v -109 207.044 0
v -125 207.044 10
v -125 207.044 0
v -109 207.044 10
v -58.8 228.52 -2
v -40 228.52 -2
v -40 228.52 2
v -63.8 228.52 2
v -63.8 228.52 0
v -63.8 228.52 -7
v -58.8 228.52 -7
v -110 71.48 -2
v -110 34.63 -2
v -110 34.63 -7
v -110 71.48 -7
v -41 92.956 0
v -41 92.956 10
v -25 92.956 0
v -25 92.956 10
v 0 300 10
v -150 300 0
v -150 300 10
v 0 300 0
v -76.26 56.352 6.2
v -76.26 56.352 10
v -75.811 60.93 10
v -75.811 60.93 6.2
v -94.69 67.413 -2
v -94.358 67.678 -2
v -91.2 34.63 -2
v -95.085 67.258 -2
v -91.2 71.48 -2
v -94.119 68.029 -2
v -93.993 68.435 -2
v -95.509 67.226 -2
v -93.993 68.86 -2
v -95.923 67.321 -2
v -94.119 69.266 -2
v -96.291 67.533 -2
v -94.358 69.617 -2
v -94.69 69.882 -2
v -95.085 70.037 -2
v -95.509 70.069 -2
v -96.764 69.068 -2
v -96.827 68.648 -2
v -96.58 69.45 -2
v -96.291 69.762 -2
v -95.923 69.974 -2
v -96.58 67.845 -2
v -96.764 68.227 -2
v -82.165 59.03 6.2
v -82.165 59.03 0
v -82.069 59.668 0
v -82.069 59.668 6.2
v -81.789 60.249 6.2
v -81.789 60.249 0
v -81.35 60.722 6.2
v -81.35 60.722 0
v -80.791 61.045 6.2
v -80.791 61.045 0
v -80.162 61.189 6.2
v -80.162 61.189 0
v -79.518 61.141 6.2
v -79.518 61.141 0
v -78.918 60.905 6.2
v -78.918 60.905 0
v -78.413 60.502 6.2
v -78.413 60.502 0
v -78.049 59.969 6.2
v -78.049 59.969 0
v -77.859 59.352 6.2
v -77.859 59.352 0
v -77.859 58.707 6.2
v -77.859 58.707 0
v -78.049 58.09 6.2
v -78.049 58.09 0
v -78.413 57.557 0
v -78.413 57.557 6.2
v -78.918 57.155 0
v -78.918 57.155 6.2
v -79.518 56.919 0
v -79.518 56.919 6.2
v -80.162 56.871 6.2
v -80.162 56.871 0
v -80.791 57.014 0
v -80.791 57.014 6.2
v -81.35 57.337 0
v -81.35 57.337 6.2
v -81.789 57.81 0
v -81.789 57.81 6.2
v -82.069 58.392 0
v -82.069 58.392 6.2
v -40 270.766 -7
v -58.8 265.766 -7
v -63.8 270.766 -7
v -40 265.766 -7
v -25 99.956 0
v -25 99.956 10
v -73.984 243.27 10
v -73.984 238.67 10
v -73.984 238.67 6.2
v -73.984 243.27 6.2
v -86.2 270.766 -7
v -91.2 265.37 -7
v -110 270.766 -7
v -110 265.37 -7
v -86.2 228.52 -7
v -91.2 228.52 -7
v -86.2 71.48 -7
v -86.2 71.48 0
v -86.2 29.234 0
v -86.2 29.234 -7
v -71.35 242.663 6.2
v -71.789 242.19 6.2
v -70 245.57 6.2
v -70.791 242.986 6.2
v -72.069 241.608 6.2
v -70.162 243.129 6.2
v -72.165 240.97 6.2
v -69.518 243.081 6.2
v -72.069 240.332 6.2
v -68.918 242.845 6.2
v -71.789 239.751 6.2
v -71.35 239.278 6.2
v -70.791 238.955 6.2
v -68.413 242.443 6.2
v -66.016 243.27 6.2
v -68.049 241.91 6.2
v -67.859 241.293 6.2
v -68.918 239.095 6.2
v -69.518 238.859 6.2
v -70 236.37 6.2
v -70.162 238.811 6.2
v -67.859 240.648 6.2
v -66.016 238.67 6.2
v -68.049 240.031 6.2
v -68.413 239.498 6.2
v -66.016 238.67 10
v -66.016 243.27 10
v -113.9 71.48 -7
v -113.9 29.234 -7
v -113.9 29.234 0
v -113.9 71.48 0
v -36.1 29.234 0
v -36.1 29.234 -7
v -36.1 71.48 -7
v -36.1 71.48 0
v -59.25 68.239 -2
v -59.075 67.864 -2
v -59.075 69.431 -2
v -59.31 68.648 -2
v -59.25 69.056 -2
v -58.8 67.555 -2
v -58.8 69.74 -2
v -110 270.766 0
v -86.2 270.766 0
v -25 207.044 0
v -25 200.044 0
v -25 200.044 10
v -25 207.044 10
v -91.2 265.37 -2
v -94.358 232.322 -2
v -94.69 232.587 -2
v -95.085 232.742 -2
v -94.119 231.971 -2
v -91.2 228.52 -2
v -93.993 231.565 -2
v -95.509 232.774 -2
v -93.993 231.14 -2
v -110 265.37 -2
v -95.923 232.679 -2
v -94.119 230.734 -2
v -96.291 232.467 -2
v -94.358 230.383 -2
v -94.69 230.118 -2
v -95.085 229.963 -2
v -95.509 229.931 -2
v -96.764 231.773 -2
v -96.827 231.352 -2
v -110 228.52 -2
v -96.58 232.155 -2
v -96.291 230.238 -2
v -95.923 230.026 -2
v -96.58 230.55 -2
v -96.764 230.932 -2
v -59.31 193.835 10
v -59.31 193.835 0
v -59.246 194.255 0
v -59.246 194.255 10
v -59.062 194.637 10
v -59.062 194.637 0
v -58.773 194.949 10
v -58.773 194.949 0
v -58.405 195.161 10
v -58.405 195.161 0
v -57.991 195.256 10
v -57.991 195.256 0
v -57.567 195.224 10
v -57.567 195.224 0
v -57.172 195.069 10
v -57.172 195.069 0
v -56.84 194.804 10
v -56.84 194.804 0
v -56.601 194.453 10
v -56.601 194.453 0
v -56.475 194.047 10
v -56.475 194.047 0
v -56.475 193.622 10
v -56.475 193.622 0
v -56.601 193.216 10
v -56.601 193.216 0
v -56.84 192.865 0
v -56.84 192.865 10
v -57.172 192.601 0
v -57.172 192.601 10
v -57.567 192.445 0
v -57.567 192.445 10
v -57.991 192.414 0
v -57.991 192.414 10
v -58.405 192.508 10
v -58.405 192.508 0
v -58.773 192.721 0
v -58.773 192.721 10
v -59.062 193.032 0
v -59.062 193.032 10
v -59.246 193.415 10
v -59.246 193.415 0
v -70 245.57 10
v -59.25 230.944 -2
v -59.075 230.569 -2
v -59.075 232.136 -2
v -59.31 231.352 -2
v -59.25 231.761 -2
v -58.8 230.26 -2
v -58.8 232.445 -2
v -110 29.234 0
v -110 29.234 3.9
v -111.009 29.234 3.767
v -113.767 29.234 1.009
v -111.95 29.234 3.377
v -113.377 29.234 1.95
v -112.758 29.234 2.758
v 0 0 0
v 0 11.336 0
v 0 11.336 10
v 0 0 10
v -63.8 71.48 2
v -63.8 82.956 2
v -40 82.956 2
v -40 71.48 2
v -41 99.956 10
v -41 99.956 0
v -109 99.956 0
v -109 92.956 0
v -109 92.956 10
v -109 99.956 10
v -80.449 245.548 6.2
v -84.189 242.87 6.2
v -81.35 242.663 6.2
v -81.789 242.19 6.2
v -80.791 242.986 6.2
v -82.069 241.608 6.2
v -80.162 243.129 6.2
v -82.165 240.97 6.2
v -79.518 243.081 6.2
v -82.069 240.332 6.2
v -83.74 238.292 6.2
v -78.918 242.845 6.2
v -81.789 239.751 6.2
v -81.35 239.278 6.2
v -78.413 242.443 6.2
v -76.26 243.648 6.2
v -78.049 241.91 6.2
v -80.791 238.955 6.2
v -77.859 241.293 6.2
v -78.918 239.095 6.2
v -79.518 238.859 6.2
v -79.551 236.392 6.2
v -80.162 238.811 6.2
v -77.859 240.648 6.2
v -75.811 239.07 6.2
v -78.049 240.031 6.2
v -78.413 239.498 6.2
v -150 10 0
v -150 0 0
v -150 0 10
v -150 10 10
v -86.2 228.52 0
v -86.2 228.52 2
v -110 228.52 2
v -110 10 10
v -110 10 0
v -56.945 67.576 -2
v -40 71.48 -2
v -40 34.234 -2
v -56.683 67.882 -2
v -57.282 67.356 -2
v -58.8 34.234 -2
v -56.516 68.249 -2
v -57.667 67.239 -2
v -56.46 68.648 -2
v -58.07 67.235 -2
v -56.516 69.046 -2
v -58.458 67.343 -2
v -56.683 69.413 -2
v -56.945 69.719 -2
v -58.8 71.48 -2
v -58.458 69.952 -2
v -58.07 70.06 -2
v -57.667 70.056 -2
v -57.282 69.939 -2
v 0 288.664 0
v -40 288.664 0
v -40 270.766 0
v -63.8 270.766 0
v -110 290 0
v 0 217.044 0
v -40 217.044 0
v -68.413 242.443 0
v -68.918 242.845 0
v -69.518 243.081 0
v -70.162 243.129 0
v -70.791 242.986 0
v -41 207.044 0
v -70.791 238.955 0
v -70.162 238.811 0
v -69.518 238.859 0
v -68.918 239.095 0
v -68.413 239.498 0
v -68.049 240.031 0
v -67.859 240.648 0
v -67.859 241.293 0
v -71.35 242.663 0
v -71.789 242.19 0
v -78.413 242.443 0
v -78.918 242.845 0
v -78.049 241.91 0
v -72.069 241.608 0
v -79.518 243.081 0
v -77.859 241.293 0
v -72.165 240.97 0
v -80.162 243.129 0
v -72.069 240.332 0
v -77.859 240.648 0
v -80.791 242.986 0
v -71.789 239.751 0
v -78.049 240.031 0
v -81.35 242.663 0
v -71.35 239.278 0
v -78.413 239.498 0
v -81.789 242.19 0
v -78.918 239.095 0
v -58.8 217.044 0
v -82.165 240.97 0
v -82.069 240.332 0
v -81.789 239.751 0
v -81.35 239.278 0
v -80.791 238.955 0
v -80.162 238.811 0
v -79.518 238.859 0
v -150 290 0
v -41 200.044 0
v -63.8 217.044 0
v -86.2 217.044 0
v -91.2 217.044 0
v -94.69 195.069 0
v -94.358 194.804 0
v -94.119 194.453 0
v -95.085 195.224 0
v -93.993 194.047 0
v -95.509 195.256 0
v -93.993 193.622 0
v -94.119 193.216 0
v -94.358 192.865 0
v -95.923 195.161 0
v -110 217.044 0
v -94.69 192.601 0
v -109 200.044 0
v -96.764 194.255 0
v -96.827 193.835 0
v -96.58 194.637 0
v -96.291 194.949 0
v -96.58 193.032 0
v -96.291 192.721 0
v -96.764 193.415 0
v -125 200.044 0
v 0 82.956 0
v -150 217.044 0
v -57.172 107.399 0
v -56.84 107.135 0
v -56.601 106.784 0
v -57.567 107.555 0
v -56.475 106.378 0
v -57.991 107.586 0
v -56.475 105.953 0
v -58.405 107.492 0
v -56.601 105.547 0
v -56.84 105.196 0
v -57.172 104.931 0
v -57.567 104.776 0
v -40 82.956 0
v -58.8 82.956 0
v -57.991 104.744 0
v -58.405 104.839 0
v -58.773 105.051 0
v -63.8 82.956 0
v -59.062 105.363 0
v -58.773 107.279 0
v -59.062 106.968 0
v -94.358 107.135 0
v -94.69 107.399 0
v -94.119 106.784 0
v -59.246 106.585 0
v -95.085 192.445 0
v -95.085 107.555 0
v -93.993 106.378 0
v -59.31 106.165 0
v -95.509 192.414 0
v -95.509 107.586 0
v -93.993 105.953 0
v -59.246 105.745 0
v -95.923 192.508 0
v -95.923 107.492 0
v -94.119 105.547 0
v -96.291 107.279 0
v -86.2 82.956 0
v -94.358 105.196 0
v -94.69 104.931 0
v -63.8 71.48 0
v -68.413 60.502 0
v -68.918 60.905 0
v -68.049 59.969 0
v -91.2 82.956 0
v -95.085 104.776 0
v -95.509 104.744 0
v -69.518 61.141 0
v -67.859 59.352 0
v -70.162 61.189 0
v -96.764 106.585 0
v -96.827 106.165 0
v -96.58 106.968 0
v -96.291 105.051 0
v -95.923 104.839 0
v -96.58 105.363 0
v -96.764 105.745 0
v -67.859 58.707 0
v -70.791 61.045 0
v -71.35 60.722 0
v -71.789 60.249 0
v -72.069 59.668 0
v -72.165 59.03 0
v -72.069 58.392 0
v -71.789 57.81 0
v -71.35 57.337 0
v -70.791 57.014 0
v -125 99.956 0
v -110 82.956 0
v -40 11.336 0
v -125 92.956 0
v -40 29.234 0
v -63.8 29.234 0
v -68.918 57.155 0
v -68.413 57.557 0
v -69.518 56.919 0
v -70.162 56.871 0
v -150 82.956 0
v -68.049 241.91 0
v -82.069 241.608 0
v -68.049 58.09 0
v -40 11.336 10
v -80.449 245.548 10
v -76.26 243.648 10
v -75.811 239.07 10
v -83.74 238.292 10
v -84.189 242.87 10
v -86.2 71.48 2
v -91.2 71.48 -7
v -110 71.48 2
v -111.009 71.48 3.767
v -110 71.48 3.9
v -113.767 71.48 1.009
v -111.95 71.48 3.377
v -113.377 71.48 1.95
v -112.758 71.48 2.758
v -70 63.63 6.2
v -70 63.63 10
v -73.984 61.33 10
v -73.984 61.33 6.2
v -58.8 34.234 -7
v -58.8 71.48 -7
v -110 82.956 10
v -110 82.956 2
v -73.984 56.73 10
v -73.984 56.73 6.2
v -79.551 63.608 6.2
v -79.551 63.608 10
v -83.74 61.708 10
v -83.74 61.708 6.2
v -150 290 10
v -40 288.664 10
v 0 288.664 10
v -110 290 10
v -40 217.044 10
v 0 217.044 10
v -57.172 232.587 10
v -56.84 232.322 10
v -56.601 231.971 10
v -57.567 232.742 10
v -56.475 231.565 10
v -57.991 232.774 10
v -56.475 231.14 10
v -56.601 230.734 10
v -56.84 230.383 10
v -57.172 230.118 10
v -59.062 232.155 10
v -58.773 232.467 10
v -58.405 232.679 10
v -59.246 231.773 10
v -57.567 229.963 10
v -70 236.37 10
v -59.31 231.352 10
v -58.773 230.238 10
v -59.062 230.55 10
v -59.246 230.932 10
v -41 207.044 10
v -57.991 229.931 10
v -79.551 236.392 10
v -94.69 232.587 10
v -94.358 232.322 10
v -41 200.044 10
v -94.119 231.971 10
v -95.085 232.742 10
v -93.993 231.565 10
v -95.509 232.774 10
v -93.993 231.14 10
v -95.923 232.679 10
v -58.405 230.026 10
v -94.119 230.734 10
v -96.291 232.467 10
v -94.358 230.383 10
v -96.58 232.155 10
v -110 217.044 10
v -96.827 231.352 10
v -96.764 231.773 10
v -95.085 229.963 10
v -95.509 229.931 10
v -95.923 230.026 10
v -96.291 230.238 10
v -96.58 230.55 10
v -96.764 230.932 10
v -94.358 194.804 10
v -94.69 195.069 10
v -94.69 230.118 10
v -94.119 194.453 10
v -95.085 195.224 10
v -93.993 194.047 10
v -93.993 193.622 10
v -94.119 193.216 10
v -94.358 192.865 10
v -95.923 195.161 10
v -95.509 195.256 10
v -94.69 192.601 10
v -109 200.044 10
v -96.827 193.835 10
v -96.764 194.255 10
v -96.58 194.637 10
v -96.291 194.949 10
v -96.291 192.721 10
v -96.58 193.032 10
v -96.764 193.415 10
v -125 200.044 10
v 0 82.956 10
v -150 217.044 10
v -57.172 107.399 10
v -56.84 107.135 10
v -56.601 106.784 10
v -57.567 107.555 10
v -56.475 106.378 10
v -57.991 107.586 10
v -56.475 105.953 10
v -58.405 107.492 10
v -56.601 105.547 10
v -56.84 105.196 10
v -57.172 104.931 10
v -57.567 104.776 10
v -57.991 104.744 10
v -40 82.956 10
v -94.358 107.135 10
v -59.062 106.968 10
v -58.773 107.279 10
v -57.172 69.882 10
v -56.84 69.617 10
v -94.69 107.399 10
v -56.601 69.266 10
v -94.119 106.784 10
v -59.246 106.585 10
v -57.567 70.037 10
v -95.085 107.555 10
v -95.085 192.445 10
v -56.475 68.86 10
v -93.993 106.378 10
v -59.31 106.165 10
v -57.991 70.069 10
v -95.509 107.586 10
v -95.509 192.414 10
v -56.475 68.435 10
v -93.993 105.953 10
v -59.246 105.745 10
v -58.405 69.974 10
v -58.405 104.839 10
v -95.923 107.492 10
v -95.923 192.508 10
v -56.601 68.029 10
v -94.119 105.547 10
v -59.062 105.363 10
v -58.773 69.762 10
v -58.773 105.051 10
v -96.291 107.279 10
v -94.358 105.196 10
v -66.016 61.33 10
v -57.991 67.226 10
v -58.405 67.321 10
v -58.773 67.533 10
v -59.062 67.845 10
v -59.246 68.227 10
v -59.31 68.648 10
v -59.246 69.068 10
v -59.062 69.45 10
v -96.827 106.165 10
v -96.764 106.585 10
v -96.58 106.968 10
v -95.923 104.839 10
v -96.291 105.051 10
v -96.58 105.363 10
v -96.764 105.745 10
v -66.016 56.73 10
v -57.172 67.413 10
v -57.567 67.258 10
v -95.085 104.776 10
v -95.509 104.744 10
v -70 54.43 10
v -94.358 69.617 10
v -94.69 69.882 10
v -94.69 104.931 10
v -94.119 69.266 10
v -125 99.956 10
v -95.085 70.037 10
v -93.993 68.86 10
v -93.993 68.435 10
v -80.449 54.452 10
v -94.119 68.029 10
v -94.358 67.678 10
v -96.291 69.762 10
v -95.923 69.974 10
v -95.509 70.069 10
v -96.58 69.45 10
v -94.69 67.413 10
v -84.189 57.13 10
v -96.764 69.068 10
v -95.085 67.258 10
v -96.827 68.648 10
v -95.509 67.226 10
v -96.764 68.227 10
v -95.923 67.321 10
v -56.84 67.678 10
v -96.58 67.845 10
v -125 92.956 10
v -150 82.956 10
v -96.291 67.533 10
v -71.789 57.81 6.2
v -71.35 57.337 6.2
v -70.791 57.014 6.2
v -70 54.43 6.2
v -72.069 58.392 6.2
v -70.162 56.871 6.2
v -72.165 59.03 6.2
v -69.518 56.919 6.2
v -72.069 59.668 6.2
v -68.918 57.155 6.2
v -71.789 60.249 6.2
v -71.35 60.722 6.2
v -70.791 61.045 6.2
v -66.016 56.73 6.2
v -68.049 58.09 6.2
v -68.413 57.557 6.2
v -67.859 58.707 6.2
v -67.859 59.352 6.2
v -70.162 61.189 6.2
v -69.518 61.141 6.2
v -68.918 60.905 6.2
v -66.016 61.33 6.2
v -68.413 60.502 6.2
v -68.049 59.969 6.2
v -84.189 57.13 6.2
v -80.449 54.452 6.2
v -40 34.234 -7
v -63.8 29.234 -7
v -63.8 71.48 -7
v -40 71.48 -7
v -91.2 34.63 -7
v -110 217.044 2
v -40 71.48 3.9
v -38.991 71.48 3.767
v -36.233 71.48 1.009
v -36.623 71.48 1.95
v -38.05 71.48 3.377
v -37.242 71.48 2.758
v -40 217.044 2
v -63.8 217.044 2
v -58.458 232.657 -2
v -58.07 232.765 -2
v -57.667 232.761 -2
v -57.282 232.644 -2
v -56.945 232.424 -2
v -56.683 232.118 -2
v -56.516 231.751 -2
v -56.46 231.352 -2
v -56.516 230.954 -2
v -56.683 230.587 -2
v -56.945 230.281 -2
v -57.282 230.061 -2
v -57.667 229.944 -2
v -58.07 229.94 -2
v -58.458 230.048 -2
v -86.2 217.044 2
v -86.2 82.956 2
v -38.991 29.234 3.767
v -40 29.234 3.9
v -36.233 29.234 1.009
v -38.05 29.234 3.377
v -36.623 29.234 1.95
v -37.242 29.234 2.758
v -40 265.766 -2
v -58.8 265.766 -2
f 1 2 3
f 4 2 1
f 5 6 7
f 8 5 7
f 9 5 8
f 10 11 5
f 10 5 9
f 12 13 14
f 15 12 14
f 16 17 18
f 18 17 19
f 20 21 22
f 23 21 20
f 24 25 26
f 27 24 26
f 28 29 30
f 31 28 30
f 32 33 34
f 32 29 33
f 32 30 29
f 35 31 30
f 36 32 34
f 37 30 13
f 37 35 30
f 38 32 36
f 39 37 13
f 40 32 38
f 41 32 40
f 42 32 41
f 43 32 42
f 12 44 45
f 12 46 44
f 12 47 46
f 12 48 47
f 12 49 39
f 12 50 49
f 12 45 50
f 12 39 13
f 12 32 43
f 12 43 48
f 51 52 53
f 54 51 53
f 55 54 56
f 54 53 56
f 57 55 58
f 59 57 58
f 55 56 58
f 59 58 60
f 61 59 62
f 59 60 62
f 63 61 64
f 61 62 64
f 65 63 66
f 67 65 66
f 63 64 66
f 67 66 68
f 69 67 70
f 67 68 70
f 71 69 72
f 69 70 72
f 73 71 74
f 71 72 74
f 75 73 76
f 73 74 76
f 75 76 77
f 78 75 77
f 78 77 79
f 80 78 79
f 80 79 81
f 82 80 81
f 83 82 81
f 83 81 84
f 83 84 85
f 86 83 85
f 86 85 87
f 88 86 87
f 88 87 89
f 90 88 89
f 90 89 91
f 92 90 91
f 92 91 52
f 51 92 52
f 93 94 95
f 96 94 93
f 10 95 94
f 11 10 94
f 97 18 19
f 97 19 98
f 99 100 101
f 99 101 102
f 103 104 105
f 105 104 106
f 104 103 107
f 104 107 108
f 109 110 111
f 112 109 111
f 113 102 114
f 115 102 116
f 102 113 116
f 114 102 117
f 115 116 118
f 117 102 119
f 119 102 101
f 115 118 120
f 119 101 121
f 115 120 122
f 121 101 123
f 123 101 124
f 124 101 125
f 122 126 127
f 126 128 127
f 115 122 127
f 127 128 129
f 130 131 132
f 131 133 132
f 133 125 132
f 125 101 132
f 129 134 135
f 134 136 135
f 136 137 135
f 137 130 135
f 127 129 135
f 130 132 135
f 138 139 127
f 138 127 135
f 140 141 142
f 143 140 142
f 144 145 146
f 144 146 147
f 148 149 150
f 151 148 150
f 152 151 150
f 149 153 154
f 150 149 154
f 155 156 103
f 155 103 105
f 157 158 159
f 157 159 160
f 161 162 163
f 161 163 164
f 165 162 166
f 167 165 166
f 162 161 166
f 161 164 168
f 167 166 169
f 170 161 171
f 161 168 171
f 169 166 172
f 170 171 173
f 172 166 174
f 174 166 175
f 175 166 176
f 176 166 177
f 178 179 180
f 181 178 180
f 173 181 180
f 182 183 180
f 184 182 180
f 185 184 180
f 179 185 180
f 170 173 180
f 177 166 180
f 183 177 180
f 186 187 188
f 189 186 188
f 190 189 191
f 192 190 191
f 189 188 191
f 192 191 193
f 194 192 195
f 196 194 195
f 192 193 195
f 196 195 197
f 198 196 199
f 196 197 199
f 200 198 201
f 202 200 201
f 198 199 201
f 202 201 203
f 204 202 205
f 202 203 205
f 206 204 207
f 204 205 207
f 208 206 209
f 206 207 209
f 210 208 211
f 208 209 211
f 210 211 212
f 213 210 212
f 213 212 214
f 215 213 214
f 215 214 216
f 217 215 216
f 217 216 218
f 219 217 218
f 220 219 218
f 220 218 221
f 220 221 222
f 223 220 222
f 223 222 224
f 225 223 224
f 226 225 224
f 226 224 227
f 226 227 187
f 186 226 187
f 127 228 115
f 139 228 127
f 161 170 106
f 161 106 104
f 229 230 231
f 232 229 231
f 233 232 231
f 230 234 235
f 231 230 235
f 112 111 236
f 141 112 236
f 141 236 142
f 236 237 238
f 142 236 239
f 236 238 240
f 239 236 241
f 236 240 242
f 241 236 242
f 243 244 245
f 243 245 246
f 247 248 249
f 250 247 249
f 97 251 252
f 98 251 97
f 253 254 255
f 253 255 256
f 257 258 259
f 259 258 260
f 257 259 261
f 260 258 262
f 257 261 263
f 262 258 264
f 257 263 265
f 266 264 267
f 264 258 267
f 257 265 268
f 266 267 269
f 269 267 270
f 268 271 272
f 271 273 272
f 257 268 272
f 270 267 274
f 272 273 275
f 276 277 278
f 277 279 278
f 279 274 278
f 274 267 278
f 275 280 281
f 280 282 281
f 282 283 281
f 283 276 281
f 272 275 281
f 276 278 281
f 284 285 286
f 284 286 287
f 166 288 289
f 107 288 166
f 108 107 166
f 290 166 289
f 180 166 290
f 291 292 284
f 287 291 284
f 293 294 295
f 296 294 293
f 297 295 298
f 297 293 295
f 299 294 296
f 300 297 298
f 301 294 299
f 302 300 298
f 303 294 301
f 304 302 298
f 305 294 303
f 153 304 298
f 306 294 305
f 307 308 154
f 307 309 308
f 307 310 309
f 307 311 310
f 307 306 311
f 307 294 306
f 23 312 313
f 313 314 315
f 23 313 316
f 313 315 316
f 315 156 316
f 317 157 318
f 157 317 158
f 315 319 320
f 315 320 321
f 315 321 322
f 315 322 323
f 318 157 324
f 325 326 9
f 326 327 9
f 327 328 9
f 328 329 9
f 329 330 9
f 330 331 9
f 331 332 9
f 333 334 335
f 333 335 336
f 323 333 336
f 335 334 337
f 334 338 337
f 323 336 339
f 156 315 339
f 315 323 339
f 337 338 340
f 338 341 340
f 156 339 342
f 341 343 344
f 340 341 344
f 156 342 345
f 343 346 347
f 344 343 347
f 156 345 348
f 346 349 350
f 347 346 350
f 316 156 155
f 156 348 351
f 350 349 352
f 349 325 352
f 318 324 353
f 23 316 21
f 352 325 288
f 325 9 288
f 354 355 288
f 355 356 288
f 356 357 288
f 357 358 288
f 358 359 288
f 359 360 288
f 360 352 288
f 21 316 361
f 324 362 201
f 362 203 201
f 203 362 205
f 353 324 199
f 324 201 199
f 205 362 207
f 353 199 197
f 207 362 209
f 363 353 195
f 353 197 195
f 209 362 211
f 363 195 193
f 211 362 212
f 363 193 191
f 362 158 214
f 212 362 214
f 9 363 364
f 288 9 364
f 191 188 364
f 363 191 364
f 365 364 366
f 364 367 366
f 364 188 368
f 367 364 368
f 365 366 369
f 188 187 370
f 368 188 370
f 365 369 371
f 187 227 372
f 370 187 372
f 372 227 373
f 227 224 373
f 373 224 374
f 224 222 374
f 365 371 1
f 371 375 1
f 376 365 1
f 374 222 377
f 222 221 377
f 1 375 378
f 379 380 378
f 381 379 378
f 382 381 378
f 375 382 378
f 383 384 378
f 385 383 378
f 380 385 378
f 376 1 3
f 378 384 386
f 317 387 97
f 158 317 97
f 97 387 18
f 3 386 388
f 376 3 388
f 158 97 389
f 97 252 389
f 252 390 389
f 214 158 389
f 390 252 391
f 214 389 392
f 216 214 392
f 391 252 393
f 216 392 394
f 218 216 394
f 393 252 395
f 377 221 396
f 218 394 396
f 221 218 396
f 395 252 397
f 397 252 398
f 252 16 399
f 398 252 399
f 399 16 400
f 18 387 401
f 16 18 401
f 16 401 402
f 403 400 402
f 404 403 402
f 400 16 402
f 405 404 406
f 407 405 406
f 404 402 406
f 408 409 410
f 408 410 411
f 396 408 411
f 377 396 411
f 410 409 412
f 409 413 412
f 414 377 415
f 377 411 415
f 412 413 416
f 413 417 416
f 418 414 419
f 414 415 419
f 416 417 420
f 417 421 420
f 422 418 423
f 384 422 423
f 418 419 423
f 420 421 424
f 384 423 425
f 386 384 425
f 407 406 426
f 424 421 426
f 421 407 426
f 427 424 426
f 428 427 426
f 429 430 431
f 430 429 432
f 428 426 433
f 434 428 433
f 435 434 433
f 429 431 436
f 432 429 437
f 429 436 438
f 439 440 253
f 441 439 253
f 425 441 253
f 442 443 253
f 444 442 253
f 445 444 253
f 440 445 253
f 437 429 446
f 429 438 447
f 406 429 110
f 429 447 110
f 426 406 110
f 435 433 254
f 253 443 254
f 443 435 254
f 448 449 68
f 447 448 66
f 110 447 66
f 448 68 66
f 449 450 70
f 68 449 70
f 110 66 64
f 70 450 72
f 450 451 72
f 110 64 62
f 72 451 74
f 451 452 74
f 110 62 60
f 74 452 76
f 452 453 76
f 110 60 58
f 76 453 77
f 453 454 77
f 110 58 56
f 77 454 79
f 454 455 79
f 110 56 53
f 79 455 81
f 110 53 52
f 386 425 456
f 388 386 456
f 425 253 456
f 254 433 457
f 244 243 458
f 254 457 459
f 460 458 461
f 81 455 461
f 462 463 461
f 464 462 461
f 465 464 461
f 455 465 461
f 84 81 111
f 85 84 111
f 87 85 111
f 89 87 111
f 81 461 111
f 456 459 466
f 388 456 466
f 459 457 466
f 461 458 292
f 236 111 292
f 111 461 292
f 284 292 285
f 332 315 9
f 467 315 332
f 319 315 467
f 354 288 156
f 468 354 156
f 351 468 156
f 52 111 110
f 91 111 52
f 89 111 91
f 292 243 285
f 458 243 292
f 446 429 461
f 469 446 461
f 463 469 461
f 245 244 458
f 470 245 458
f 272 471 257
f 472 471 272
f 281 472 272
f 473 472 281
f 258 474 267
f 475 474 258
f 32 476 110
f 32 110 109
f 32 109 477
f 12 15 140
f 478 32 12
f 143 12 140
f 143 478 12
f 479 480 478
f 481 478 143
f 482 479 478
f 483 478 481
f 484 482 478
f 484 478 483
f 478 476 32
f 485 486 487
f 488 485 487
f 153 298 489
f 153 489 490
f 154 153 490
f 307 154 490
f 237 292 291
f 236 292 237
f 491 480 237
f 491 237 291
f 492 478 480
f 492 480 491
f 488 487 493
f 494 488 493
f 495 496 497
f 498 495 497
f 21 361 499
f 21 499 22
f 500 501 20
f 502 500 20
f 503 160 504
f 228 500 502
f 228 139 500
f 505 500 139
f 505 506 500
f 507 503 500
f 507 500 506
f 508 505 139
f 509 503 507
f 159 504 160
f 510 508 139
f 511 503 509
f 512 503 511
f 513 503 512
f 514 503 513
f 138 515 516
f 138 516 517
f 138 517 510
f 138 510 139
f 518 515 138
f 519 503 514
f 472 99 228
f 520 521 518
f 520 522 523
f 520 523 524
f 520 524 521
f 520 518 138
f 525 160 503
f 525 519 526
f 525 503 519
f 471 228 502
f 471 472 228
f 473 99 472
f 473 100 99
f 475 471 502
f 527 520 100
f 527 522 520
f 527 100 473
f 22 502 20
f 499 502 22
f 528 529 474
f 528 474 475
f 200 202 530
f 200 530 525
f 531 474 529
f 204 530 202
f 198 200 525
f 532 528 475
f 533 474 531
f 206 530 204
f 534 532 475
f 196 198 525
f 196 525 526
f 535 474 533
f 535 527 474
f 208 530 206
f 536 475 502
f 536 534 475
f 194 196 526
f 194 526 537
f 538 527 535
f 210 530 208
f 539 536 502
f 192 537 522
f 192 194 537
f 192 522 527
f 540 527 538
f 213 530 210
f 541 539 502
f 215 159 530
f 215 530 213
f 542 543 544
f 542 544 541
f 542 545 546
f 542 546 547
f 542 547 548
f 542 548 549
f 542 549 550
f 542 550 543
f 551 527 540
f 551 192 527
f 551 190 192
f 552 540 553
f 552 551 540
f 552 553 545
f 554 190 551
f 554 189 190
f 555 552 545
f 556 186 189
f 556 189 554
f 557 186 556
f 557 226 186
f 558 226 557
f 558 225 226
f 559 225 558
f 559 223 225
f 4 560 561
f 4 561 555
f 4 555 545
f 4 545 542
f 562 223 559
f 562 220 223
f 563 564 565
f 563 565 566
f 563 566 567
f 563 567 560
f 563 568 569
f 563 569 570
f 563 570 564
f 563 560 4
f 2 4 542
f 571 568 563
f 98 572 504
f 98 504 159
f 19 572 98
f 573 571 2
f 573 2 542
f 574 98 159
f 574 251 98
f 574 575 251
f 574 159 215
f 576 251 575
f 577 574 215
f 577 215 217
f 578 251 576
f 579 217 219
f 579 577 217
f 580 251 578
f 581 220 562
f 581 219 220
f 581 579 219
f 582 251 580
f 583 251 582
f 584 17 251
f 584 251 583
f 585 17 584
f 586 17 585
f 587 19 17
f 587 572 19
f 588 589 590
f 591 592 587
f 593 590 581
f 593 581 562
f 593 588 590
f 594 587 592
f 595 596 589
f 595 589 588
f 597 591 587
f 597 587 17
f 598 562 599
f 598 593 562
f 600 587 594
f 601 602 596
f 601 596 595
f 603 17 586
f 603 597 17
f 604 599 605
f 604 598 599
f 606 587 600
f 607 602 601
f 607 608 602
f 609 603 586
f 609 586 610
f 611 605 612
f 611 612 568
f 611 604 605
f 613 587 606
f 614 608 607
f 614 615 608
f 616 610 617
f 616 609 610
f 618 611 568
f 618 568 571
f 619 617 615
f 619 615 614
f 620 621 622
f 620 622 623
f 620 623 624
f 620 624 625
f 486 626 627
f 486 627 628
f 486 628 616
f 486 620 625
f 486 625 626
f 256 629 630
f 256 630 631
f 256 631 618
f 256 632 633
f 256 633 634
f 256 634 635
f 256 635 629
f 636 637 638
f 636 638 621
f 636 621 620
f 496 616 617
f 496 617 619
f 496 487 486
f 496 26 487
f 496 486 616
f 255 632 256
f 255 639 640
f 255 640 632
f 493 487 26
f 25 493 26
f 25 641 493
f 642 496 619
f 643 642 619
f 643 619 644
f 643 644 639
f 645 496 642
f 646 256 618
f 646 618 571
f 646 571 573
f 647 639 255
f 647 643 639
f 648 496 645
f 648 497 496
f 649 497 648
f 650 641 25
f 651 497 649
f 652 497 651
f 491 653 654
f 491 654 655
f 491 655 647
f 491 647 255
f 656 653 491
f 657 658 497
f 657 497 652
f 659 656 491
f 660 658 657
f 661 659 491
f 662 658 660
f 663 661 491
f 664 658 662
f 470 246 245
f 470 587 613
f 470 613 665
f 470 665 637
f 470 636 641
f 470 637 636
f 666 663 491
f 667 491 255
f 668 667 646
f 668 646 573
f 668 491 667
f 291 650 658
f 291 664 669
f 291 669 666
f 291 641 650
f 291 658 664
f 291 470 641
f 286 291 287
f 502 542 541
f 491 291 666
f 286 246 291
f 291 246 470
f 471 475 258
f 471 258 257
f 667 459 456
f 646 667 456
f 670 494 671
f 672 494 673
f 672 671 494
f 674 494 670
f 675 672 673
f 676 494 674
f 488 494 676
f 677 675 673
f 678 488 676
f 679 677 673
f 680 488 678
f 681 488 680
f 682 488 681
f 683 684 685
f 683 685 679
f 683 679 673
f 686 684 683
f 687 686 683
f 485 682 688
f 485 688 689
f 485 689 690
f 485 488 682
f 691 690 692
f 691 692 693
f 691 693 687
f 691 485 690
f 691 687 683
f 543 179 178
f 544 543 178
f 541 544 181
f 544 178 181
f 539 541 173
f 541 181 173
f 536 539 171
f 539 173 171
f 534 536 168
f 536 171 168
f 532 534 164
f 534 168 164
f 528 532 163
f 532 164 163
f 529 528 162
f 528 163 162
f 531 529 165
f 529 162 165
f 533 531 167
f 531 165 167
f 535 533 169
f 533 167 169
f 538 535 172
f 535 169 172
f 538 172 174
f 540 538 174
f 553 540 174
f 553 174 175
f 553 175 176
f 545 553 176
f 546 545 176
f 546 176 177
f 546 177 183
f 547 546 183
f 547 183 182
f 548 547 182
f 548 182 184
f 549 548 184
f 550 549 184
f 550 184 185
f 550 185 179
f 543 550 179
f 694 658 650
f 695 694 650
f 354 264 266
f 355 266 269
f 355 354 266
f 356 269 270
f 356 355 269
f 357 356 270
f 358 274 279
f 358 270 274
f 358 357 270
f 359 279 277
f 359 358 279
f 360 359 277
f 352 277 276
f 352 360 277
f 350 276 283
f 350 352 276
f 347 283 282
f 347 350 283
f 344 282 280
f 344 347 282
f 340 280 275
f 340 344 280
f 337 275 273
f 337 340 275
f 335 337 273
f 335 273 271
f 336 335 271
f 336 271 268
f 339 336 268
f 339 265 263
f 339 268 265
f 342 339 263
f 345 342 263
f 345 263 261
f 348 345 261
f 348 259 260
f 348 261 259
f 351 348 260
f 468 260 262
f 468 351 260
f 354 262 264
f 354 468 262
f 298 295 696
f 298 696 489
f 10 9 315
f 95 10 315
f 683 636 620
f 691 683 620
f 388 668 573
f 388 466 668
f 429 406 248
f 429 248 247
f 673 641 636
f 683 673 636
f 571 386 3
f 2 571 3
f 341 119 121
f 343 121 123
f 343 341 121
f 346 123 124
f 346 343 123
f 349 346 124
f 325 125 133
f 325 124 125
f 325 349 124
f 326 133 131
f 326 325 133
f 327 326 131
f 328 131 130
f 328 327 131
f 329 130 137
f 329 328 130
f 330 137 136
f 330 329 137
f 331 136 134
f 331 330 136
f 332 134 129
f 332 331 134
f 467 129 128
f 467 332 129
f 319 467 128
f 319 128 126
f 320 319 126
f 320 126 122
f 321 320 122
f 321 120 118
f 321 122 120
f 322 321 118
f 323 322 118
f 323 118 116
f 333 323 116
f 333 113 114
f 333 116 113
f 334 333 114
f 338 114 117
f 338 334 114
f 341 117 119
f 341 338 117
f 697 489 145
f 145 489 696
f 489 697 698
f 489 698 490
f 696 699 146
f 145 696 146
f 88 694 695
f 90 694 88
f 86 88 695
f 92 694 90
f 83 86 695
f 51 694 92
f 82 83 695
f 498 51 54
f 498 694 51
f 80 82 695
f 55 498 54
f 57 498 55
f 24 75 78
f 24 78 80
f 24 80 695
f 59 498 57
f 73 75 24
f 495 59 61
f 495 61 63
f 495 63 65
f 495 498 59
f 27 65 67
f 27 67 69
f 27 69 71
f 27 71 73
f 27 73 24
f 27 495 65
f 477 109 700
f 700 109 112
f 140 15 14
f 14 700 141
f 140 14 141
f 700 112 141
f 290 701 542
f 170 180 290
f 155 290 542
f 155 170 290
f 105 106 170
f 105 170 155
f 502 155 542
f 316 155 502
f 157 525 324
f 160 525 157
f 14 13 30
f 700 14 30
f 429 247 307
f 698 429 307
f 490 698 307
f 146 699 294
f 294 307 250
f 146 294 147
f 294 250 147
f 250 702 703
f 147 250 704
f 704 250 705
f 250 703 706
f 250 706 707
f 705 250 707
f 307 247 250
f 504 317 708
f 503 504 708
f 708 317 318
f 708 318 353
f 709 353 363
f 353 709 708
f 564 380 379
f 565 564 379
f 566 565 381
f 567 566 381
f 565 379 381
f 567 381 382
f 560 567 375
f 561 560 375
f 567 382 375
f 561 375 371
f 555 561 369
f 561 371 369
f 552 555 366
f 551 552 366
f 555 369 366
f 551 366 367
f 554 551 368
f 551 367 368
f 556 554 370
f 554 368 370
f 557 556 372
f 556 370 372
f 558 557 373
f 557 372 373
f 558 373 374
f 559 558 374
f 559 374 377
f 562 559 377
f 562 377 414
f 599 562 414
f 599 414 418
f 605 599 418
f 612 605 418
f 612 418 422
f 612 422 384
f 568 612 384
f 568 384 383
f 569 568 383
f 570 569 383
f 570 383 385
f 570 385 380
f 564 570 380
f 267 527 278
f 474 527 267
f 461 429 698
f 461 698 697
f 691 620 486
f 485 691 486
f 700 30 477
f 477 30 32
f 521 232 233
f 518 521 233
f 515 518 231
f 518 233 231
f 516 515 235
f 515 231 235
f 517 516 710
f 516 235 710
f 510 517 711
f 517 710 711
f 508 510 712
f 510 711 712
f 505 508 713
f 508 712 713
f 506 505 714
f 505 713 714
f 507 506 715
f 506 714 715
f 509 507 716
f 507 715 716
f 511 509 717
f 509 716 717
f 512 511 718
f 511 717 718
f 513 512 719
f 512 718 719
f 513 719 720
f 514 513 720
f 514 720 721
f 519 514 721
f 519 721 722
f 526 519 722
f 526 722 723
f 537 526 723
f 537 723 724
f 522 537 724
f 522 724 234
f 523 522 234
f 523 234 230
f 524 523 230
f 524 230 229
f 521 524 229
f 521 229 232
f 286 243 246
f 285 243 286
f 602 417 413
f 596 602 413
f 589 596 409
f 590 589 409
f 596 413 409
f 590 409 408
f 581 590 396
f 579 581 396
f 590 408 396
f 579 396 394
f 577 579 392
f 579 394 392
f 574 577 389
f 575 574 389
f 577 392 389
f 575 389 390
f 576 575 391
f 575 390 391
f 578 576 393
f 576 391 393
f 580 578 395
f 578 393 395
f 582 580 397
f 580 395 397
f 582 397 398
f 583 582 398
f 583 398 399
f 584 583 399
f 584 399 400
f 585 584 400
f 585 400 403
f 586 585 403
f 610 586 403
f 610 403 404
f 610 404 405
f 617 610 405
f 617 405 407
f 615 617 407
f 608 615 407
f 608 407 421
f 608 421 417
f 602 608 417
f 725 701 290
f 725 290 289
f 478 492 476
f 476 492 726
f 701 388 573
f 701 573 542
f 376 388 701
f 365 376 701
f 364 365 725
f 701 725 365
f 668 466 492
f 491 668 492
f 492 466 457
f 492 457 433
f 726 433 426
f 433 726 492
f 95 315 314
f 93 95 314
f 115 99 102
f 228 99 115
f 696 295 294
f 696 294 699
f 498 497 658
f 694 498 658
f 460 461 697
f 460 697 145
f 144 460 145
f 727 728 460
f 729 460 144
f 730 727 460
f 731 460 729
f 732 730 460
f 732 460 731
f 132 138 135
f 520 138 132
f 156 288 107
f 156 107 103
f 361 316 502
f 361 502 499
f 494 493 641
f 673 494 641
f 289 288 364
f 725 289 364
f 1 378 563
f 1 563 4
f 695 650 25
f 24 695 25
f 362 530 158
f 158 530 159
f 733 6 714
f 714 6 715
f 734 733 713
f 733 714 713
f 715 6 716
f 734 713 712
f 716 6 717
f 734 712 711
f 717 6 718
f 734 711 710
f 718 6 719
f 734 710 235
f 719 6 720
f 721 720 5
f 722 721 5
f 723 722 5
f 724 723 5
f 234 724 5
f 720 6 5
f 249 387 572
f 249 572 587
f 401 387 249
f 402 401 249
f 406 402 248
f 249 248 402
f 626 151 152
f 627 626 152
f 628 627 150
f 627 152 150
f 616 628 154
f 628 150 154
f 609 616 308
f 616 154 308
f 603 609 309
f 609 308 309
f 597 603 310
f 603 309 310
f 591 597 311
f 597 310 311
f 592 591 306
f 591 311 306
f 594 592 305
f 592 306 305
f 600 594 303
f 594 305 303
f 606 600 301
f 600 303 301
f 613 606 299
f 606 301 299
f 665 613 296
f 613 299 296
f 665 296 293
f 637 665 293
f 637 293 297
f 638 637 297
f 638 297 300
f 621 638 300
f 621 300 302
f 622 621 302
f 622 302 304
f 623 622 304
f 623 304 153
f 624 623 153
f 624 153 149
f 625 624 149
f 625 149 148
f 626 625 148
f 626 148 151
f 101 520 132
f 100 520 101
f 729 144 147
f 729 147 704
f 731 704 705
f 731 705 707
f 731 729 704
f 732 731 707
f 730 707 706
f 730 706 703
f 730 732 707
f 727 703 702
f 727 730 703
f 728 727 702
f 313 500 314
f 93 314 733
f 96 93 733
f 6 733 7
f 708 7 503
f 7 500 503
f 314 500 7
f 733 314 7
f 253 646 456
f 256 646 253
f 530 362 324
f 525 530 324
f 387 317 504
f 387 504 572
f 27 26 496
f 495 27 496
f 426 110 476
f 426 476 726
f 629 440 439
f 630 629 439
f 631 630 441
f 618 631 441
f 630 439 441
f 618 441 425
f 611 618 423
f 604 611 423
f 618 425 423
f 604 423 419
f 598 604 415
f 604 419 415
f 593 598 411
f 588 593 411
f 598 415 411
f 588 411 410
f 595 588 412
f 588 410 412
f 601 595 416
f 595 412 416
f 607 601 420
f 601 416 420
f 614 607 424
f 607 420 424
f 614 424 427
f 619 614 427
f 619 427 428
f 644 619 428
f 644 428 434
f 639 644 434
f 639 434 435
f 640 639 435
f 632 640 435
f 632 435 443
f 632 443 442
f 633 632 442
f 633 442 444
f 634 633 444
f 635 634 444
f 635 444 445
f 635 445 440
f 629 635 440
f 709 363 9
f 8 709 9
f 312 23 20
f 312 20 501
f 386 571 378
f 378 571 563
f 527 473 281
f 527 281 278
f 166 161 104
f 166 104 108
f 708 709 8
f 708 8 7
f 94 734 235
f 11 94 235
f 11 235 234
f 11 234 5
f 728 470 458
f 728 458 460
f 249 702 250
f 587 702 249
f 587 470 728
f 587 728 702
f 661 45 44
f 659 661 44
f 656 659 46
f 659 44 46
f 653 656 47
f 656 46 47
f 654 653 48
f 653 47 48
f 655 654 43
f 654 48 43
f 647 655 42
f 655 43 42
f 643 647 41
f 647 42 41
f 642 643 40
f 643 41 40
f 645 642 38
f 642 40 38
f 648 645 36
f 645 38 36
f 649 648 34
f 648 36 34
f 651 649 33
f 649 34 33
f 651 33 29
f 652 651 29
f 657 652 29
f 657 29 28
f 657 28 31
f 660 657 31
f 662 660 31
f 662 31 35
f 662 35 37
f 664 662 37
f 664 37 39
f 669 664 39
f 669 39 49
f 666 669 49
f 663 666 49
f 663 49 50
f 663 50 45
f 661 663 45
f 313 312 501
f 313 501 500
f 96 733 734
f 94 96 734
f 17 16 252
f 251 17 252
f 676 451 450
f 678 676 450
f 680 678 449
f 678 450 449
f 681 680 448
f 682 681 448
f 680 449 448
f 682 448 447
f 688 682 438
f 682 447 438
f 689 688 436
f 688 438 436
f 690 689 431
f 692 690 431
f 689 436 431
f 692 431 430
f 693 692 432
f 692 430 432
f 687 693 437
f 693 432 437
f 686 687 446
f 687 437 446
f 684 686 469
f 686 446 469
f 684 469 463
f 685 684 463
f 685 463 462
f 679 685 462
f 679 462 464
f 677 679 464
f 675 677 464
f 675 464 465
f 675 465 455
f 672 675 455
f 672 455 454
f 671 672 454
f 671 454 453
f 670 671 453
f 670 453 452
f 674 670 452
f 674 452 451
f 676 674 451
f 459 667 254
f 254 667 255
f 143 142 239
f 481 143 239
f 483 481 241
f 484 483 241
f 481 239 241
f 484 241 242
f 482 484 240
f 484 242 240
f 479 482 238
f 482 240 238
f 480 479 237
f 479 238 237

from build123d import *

# Parameters (mm, degrees)
BOSS_EXTRUDE1_DEPTH       = 10
BOSS_EXTRUDE3_DEPTH       = 7
SKETCH4_W                 = 18.8
SKETCH4_H                 = 48.722574615
SKETCH4_H_2               = 48.326634129
BOSS_EXTRUDE4_DEPTH       = 2
CUT_EXTRUDE2_DEPTH        = 9
SKETCH7_R                 = 2.165
CUT_EXTRUDE3_DEPTH        = 336.559234711
CUT_EXTRUDE4_DEPTH        = 3.8
BOSS_EXTRUDE5_DEPTH       = 42.245940515
SKETCH10_W                = 40
SKETCH10_H                = 8.663840555
SKETCH10_H_2              = 10
CUT_EXTRUDE5_DEPTH        = 336.559234711
SKETCH11_W                = 40
SKETCH11_H                = 17.043549312
BOSS_EXTRUDE6_DEPTH       = 10
CUT_EXTRUDE6_REACH        = 337.841
SKETCH12_W                = 16
SKETCH12_H                = 7
F_1_5MM_DOWEL_HOLE1_D     = 2.85
F_1_5MM_DOWEL_HOLE1_DEPTH = 12


with BuildPart() as part:
    # Sketch2 → Boss-Extrude1 (new body)
    with BuildSketch(Plane.XY):
        Polygon((0, 0), (-150, 0), (-150, 20), (-110, 20), (-110, 100), (-150, 100), (-150, 200), (-110, 200), (-110, 280), (-150, 280), (-150, 300), (0, 300), (0, 280), (-40, 280), (-40, 200), (0, 200), (0, 100), (-40, 100), (-40, 20), (0, 20), align=None)
    extrude(amount=BOSS_EXTRUDE1_DEPTH)

    # Sketch3 → Boss-Extrude3 (add)
    with BuildSketch(Plane(origin=(0, 0, 0), x_dir=(-1, 0, 0), z_dir=(0, 0, -1))):
        Polygon((40, 34.233876073), (58.8, 34.233876073), (58.8, 82.956450688), (63.8, 82.956450688), (63.8, 29.233876073), (40, 29.233876073), align=None)
        Polygon((110, 34.629816559), (91.2, 34.629816559), (91.2, 82.956450688), (86.2, 82.956450688), (86.2, 29.233876073), (110, 29.233876073), align=None)
    boss_extrude3 = extrude(amount=BOSS_EXTRUDE3_DEPTH)

    # Sketch4 → Boss-Extrude4 (add)
    with BuildSketch(Plane(origin=(0, 0, 0), x_dir=(-1, 0, 0), z_dir=(0, 0, -1))):
        with Locations((49.4, 58.595163381)):
            Rectangle(SKETCH4_W, SKETCH4_H)
        with Locations((100.6, 58.793133624)):
            Rectangle(SKETCH4_W, SKETCH4_H_2)
    boss_extrude4 = extrude(amount=BOSS_EXTRUDE4_DEPTH)

    # Sketch6 → Cut-Extrude2 (cut)
    with BuildSketch(Plane(origin=(0, 0, -7), x_dir=(-1, 0, 0), z_dir=(0, 0, -1))):
        Polygon((40, 82.956450688), (55.172474276, 82.956450688), (63.8, 82.956450688), (63.8, 71.479816588), (58.8, 71.479816588), (40, 71.479816588), align=None)
        Polygon((91.2, 82.956450688), (110, 82.956450688), (110, 71.479816588), (95.490694749, 71.479816588), (86.2, 71.479816588), (86.2, 82.956450688), align=None)
    cut_extrude2 = extrude(amount=-CUT_EXTRUDE2_DEPTH, mode=Mode.SUBTRACT)

    # Sketch7 → Cut-Extrude3 (cut, through all)
    with BuildSketch(Plane(origin=(0, 0, 0), x_dir=(-1, 0, 0), z_dir=(0, 0, -1))):
        with Locations((70, 59.0298166)):
            Circle(SKETCH7_R)
        with Locations((80, 59.0298166)):
            Circle(SKETCH7_R)
    cut_extrude3 = extrude(amount=-CUT_EXTRUDE3_DEPTH, mode=Mode.SUBTRACT)

    # Sketch8 → Cut-Extrude4 (cut)
    with BuildSketch(Plane.XY.offset(10)):
        Polygon((-83.740057918, 61.707869394), (-84.189290711, 57.129857828), (-80.449232793, 54.451805034), (-76.259942082, 56.351763806), (-75.810709289, 60.929775372), (-79.550767207, 63.607828166), align=None)
        Polygon((-70, 63.6298166), (-73.983716857, 61.3298166), (-73.983716857, 56.7298166), (-70, 54.4298166), (-66.016283143, 56.7298166), (-66.016283143, 61.3298166), align=None)
    cut_extrude4 = extrude(amount=-CUT_EXTRUDE4_DEPTH, mode=Mode.SUBTRACT)

    # Sketch9 → Boss-Extrude5 (add)
    with BuildSketch(Plane.XZ.offset(-29.233876073)):
        with BuildLine():
            Line((-110, -7), (-113.9, -7))
            Line((-113.9, -7), (-113.9, 0))
            ThreePointArc((-113.9, 0), (-112.757716447, 2.757716447), (-110, 3.9))
            Line((-110, 3.9), (-110, 0))
            Line((-110, 0), (-110, -7))
        make_face()
        with BuildLine():
            Line((-40, -7), (-36.1, -7))
            Line((-36.1, -7), (-36.1, 0))
            ThreePointArc((-36.1, 0), (-37.242283553, 2.757716447), (-40, 3.9))
            Line((-40, 3.9), (-40, 0))
            Line((-40, 0), (-40, -7))
        make_face()
    extrude(amount=-BOSS_EXTRUDE5_DEPTH)

    # Mirror2: Boss-Extrude3, Boss-Extrude4, Cut-Extrude2 across plane
    add(boss_extrude3.mirror(Plane.ZX.offset(150)))
    add(boss_extrude4.mirror(Plane.ZX.offset(150)))
    add(cut_extrude2.mirror(Plane.ZX.offset(150)), mode=Mode.SUBTRACT)

    # Mirror3: Cut-Extrude3 across plane
    add(cut_extrude3.mirror(Plane.ZX.offset(150)), mode=Mode.SUBTRACT)

    # Mirror4: Cut-Extrude4 across plane
    add(cut_extrude4.mirror(Plane.ZX.offset(150)), mode=Mode.SUBTRACT)

    # Sketch10 → Cut-Extrude5 (cut, through all)
    with BuildSketch(Plane(origin=(0, 0, 0), x_dir=(-1, 0, 0), z_dir=(0, 0, -1))):
        with Locations((20, 284.331920277)):
            Rectangle(SKETCH10_W, SKETCH10_H)
        with Locations((130, 285)):
            Rectangle(SKETCH10_W, SKETCH10_H_2)
    cut_extrude5 = extrude(amount=-CUT_EXTRUDE5_DEPTH, mode=Mode.SUBTRACT)

    # Mirror5: Cut-Extrude5 across plane
    add(cut_extrude5.mirror(Plane.ZX.offset(150)), mode=Mode.SUBTRACT)

    # Sketch11 → Boss-Extrude6 (add, through all)
    with BuildSketch(Plane(origin=(0, 0, 0), x_dir=(-1, 0, 0), z_dir=(0, 0, -1))):
        with Locations((20, 208.521774656)):
            Rectangle(SKETCH11_W, SKETCH11_H)
        with Locations((130, 208.521774656)):
            Rectangle(SKETCH11_W, SKETCH11_H)
    boss_extrude6 = extrude(amount=-BOSS_EXTRUDE6_DEPTH)

    # Mirror6: Boss-Extrude6 across plane
    add(boss_extrude6.mirror(Plane.ZX.offset(150)))

    # Sketch12 → Cut-Extrude6 (cut, up to next)
    with BuildSketch(Plane.XY.offset(10), mode=Mode.PRIVATE) as cut_extrude6_sk1:
        with Locations((-117, 203.543549312)):
            Rectangle(SKETCH12_W, SKETCH12_H)
    cut_extrude6_tool1 = extrude(cut_extrude6_sk1.sketch, amount=-CUT_EXTRUDE6_REACH, mode=Mode.PRIVATE) & part.part
    # Sketch12 → Cut-Extrude6 (cut, up to next)
    with BuildSketch(Plane.XY.offset(10), mode=Mode.PRIVATE) as cut_extrude6_sk2:
        with Locations((-33, 203.543549312)):
            Rectangle(SKETCH12_W, SKETCH12_H)
    cut_extrude6_tool2 = extrude(cut_extrude6_sk2.sketch, amount=-CUT_EXTRUDE6_REACH, mode=Mode.PRIVATE) & part.part
    # Sketch12 → Cut-Extrude6 (cut, up to next)
    with BuildSketch(Plane.XY.offset(10), mode=Mode.PRIVATE) as cut_extrude6_sk3:
        with Locations((-117, 96.456450688)):
            Rectangle(SKETCH12_W, SKETCH12_H)
    cut_extrude6_tool3 = extrude(cut_extrude6_sk3.sketch, amount=-CUT_EXTRUDE6_REACH, mode=Mode.PRIVATE) & part.part
    # Sketch12 → Cut-Extrude6 (cut, up to next)
    with BuildSketch(Plane.XY.offset(10), mode=Mode.PRIVATE) as cut_extrude6_sk4:
        with Locations((-33, 96.456450688)):
            Rectangle(SKETCH12_W, SKETCH12_H)
    cut_extrude6_tool4 = extrude(cut_extrude6_sk4.sketch, amount=-CUT_EXTRUDE6_REACH, mode=Mode.PRIVATE) & part.part
    add(cut_extrude6_tool1.solids().sort_by_distance((-117, 203.543549, 10))[0], mode=Mode.SUBTRACT)
    add(cut_extrude6_tool2.solids().sort_by_distance((-33, 203.543549, 10))[0], mode=Mode.SUBTRACT)
    add(cut_extrude6_tool3.solids().sort_by_distance((-117, 96.456451, 10))[0], mode=Mode.SUBTRACT)
    add(cut_extrude6_tool4.solids().sort_by_distance((-33, 96.456451, 10))[0], mode=Mode.SUBTRACT)

    # Ø1.5mm Dowel Hole1
    with Locations(Plane.XY.offset(10)):
        with Locations((-57.884566311, 231.352487628), (-95.402442942, 231.352487628), (-95.402442942, 193.834610997), (-57.884566311, 193.834610997), (-95.402442942, 68.647512372), (-57.884566311, 106.165389003), (-57.884566311, 68.647512372), (-95.402442942, 106.165389003)):
            Hole(F_1_5MM_DOWEL_HOLE1_D / 2, depth=F_1_5MM_DOWEL_HOLE1_DEPTH)


solid = part.part
